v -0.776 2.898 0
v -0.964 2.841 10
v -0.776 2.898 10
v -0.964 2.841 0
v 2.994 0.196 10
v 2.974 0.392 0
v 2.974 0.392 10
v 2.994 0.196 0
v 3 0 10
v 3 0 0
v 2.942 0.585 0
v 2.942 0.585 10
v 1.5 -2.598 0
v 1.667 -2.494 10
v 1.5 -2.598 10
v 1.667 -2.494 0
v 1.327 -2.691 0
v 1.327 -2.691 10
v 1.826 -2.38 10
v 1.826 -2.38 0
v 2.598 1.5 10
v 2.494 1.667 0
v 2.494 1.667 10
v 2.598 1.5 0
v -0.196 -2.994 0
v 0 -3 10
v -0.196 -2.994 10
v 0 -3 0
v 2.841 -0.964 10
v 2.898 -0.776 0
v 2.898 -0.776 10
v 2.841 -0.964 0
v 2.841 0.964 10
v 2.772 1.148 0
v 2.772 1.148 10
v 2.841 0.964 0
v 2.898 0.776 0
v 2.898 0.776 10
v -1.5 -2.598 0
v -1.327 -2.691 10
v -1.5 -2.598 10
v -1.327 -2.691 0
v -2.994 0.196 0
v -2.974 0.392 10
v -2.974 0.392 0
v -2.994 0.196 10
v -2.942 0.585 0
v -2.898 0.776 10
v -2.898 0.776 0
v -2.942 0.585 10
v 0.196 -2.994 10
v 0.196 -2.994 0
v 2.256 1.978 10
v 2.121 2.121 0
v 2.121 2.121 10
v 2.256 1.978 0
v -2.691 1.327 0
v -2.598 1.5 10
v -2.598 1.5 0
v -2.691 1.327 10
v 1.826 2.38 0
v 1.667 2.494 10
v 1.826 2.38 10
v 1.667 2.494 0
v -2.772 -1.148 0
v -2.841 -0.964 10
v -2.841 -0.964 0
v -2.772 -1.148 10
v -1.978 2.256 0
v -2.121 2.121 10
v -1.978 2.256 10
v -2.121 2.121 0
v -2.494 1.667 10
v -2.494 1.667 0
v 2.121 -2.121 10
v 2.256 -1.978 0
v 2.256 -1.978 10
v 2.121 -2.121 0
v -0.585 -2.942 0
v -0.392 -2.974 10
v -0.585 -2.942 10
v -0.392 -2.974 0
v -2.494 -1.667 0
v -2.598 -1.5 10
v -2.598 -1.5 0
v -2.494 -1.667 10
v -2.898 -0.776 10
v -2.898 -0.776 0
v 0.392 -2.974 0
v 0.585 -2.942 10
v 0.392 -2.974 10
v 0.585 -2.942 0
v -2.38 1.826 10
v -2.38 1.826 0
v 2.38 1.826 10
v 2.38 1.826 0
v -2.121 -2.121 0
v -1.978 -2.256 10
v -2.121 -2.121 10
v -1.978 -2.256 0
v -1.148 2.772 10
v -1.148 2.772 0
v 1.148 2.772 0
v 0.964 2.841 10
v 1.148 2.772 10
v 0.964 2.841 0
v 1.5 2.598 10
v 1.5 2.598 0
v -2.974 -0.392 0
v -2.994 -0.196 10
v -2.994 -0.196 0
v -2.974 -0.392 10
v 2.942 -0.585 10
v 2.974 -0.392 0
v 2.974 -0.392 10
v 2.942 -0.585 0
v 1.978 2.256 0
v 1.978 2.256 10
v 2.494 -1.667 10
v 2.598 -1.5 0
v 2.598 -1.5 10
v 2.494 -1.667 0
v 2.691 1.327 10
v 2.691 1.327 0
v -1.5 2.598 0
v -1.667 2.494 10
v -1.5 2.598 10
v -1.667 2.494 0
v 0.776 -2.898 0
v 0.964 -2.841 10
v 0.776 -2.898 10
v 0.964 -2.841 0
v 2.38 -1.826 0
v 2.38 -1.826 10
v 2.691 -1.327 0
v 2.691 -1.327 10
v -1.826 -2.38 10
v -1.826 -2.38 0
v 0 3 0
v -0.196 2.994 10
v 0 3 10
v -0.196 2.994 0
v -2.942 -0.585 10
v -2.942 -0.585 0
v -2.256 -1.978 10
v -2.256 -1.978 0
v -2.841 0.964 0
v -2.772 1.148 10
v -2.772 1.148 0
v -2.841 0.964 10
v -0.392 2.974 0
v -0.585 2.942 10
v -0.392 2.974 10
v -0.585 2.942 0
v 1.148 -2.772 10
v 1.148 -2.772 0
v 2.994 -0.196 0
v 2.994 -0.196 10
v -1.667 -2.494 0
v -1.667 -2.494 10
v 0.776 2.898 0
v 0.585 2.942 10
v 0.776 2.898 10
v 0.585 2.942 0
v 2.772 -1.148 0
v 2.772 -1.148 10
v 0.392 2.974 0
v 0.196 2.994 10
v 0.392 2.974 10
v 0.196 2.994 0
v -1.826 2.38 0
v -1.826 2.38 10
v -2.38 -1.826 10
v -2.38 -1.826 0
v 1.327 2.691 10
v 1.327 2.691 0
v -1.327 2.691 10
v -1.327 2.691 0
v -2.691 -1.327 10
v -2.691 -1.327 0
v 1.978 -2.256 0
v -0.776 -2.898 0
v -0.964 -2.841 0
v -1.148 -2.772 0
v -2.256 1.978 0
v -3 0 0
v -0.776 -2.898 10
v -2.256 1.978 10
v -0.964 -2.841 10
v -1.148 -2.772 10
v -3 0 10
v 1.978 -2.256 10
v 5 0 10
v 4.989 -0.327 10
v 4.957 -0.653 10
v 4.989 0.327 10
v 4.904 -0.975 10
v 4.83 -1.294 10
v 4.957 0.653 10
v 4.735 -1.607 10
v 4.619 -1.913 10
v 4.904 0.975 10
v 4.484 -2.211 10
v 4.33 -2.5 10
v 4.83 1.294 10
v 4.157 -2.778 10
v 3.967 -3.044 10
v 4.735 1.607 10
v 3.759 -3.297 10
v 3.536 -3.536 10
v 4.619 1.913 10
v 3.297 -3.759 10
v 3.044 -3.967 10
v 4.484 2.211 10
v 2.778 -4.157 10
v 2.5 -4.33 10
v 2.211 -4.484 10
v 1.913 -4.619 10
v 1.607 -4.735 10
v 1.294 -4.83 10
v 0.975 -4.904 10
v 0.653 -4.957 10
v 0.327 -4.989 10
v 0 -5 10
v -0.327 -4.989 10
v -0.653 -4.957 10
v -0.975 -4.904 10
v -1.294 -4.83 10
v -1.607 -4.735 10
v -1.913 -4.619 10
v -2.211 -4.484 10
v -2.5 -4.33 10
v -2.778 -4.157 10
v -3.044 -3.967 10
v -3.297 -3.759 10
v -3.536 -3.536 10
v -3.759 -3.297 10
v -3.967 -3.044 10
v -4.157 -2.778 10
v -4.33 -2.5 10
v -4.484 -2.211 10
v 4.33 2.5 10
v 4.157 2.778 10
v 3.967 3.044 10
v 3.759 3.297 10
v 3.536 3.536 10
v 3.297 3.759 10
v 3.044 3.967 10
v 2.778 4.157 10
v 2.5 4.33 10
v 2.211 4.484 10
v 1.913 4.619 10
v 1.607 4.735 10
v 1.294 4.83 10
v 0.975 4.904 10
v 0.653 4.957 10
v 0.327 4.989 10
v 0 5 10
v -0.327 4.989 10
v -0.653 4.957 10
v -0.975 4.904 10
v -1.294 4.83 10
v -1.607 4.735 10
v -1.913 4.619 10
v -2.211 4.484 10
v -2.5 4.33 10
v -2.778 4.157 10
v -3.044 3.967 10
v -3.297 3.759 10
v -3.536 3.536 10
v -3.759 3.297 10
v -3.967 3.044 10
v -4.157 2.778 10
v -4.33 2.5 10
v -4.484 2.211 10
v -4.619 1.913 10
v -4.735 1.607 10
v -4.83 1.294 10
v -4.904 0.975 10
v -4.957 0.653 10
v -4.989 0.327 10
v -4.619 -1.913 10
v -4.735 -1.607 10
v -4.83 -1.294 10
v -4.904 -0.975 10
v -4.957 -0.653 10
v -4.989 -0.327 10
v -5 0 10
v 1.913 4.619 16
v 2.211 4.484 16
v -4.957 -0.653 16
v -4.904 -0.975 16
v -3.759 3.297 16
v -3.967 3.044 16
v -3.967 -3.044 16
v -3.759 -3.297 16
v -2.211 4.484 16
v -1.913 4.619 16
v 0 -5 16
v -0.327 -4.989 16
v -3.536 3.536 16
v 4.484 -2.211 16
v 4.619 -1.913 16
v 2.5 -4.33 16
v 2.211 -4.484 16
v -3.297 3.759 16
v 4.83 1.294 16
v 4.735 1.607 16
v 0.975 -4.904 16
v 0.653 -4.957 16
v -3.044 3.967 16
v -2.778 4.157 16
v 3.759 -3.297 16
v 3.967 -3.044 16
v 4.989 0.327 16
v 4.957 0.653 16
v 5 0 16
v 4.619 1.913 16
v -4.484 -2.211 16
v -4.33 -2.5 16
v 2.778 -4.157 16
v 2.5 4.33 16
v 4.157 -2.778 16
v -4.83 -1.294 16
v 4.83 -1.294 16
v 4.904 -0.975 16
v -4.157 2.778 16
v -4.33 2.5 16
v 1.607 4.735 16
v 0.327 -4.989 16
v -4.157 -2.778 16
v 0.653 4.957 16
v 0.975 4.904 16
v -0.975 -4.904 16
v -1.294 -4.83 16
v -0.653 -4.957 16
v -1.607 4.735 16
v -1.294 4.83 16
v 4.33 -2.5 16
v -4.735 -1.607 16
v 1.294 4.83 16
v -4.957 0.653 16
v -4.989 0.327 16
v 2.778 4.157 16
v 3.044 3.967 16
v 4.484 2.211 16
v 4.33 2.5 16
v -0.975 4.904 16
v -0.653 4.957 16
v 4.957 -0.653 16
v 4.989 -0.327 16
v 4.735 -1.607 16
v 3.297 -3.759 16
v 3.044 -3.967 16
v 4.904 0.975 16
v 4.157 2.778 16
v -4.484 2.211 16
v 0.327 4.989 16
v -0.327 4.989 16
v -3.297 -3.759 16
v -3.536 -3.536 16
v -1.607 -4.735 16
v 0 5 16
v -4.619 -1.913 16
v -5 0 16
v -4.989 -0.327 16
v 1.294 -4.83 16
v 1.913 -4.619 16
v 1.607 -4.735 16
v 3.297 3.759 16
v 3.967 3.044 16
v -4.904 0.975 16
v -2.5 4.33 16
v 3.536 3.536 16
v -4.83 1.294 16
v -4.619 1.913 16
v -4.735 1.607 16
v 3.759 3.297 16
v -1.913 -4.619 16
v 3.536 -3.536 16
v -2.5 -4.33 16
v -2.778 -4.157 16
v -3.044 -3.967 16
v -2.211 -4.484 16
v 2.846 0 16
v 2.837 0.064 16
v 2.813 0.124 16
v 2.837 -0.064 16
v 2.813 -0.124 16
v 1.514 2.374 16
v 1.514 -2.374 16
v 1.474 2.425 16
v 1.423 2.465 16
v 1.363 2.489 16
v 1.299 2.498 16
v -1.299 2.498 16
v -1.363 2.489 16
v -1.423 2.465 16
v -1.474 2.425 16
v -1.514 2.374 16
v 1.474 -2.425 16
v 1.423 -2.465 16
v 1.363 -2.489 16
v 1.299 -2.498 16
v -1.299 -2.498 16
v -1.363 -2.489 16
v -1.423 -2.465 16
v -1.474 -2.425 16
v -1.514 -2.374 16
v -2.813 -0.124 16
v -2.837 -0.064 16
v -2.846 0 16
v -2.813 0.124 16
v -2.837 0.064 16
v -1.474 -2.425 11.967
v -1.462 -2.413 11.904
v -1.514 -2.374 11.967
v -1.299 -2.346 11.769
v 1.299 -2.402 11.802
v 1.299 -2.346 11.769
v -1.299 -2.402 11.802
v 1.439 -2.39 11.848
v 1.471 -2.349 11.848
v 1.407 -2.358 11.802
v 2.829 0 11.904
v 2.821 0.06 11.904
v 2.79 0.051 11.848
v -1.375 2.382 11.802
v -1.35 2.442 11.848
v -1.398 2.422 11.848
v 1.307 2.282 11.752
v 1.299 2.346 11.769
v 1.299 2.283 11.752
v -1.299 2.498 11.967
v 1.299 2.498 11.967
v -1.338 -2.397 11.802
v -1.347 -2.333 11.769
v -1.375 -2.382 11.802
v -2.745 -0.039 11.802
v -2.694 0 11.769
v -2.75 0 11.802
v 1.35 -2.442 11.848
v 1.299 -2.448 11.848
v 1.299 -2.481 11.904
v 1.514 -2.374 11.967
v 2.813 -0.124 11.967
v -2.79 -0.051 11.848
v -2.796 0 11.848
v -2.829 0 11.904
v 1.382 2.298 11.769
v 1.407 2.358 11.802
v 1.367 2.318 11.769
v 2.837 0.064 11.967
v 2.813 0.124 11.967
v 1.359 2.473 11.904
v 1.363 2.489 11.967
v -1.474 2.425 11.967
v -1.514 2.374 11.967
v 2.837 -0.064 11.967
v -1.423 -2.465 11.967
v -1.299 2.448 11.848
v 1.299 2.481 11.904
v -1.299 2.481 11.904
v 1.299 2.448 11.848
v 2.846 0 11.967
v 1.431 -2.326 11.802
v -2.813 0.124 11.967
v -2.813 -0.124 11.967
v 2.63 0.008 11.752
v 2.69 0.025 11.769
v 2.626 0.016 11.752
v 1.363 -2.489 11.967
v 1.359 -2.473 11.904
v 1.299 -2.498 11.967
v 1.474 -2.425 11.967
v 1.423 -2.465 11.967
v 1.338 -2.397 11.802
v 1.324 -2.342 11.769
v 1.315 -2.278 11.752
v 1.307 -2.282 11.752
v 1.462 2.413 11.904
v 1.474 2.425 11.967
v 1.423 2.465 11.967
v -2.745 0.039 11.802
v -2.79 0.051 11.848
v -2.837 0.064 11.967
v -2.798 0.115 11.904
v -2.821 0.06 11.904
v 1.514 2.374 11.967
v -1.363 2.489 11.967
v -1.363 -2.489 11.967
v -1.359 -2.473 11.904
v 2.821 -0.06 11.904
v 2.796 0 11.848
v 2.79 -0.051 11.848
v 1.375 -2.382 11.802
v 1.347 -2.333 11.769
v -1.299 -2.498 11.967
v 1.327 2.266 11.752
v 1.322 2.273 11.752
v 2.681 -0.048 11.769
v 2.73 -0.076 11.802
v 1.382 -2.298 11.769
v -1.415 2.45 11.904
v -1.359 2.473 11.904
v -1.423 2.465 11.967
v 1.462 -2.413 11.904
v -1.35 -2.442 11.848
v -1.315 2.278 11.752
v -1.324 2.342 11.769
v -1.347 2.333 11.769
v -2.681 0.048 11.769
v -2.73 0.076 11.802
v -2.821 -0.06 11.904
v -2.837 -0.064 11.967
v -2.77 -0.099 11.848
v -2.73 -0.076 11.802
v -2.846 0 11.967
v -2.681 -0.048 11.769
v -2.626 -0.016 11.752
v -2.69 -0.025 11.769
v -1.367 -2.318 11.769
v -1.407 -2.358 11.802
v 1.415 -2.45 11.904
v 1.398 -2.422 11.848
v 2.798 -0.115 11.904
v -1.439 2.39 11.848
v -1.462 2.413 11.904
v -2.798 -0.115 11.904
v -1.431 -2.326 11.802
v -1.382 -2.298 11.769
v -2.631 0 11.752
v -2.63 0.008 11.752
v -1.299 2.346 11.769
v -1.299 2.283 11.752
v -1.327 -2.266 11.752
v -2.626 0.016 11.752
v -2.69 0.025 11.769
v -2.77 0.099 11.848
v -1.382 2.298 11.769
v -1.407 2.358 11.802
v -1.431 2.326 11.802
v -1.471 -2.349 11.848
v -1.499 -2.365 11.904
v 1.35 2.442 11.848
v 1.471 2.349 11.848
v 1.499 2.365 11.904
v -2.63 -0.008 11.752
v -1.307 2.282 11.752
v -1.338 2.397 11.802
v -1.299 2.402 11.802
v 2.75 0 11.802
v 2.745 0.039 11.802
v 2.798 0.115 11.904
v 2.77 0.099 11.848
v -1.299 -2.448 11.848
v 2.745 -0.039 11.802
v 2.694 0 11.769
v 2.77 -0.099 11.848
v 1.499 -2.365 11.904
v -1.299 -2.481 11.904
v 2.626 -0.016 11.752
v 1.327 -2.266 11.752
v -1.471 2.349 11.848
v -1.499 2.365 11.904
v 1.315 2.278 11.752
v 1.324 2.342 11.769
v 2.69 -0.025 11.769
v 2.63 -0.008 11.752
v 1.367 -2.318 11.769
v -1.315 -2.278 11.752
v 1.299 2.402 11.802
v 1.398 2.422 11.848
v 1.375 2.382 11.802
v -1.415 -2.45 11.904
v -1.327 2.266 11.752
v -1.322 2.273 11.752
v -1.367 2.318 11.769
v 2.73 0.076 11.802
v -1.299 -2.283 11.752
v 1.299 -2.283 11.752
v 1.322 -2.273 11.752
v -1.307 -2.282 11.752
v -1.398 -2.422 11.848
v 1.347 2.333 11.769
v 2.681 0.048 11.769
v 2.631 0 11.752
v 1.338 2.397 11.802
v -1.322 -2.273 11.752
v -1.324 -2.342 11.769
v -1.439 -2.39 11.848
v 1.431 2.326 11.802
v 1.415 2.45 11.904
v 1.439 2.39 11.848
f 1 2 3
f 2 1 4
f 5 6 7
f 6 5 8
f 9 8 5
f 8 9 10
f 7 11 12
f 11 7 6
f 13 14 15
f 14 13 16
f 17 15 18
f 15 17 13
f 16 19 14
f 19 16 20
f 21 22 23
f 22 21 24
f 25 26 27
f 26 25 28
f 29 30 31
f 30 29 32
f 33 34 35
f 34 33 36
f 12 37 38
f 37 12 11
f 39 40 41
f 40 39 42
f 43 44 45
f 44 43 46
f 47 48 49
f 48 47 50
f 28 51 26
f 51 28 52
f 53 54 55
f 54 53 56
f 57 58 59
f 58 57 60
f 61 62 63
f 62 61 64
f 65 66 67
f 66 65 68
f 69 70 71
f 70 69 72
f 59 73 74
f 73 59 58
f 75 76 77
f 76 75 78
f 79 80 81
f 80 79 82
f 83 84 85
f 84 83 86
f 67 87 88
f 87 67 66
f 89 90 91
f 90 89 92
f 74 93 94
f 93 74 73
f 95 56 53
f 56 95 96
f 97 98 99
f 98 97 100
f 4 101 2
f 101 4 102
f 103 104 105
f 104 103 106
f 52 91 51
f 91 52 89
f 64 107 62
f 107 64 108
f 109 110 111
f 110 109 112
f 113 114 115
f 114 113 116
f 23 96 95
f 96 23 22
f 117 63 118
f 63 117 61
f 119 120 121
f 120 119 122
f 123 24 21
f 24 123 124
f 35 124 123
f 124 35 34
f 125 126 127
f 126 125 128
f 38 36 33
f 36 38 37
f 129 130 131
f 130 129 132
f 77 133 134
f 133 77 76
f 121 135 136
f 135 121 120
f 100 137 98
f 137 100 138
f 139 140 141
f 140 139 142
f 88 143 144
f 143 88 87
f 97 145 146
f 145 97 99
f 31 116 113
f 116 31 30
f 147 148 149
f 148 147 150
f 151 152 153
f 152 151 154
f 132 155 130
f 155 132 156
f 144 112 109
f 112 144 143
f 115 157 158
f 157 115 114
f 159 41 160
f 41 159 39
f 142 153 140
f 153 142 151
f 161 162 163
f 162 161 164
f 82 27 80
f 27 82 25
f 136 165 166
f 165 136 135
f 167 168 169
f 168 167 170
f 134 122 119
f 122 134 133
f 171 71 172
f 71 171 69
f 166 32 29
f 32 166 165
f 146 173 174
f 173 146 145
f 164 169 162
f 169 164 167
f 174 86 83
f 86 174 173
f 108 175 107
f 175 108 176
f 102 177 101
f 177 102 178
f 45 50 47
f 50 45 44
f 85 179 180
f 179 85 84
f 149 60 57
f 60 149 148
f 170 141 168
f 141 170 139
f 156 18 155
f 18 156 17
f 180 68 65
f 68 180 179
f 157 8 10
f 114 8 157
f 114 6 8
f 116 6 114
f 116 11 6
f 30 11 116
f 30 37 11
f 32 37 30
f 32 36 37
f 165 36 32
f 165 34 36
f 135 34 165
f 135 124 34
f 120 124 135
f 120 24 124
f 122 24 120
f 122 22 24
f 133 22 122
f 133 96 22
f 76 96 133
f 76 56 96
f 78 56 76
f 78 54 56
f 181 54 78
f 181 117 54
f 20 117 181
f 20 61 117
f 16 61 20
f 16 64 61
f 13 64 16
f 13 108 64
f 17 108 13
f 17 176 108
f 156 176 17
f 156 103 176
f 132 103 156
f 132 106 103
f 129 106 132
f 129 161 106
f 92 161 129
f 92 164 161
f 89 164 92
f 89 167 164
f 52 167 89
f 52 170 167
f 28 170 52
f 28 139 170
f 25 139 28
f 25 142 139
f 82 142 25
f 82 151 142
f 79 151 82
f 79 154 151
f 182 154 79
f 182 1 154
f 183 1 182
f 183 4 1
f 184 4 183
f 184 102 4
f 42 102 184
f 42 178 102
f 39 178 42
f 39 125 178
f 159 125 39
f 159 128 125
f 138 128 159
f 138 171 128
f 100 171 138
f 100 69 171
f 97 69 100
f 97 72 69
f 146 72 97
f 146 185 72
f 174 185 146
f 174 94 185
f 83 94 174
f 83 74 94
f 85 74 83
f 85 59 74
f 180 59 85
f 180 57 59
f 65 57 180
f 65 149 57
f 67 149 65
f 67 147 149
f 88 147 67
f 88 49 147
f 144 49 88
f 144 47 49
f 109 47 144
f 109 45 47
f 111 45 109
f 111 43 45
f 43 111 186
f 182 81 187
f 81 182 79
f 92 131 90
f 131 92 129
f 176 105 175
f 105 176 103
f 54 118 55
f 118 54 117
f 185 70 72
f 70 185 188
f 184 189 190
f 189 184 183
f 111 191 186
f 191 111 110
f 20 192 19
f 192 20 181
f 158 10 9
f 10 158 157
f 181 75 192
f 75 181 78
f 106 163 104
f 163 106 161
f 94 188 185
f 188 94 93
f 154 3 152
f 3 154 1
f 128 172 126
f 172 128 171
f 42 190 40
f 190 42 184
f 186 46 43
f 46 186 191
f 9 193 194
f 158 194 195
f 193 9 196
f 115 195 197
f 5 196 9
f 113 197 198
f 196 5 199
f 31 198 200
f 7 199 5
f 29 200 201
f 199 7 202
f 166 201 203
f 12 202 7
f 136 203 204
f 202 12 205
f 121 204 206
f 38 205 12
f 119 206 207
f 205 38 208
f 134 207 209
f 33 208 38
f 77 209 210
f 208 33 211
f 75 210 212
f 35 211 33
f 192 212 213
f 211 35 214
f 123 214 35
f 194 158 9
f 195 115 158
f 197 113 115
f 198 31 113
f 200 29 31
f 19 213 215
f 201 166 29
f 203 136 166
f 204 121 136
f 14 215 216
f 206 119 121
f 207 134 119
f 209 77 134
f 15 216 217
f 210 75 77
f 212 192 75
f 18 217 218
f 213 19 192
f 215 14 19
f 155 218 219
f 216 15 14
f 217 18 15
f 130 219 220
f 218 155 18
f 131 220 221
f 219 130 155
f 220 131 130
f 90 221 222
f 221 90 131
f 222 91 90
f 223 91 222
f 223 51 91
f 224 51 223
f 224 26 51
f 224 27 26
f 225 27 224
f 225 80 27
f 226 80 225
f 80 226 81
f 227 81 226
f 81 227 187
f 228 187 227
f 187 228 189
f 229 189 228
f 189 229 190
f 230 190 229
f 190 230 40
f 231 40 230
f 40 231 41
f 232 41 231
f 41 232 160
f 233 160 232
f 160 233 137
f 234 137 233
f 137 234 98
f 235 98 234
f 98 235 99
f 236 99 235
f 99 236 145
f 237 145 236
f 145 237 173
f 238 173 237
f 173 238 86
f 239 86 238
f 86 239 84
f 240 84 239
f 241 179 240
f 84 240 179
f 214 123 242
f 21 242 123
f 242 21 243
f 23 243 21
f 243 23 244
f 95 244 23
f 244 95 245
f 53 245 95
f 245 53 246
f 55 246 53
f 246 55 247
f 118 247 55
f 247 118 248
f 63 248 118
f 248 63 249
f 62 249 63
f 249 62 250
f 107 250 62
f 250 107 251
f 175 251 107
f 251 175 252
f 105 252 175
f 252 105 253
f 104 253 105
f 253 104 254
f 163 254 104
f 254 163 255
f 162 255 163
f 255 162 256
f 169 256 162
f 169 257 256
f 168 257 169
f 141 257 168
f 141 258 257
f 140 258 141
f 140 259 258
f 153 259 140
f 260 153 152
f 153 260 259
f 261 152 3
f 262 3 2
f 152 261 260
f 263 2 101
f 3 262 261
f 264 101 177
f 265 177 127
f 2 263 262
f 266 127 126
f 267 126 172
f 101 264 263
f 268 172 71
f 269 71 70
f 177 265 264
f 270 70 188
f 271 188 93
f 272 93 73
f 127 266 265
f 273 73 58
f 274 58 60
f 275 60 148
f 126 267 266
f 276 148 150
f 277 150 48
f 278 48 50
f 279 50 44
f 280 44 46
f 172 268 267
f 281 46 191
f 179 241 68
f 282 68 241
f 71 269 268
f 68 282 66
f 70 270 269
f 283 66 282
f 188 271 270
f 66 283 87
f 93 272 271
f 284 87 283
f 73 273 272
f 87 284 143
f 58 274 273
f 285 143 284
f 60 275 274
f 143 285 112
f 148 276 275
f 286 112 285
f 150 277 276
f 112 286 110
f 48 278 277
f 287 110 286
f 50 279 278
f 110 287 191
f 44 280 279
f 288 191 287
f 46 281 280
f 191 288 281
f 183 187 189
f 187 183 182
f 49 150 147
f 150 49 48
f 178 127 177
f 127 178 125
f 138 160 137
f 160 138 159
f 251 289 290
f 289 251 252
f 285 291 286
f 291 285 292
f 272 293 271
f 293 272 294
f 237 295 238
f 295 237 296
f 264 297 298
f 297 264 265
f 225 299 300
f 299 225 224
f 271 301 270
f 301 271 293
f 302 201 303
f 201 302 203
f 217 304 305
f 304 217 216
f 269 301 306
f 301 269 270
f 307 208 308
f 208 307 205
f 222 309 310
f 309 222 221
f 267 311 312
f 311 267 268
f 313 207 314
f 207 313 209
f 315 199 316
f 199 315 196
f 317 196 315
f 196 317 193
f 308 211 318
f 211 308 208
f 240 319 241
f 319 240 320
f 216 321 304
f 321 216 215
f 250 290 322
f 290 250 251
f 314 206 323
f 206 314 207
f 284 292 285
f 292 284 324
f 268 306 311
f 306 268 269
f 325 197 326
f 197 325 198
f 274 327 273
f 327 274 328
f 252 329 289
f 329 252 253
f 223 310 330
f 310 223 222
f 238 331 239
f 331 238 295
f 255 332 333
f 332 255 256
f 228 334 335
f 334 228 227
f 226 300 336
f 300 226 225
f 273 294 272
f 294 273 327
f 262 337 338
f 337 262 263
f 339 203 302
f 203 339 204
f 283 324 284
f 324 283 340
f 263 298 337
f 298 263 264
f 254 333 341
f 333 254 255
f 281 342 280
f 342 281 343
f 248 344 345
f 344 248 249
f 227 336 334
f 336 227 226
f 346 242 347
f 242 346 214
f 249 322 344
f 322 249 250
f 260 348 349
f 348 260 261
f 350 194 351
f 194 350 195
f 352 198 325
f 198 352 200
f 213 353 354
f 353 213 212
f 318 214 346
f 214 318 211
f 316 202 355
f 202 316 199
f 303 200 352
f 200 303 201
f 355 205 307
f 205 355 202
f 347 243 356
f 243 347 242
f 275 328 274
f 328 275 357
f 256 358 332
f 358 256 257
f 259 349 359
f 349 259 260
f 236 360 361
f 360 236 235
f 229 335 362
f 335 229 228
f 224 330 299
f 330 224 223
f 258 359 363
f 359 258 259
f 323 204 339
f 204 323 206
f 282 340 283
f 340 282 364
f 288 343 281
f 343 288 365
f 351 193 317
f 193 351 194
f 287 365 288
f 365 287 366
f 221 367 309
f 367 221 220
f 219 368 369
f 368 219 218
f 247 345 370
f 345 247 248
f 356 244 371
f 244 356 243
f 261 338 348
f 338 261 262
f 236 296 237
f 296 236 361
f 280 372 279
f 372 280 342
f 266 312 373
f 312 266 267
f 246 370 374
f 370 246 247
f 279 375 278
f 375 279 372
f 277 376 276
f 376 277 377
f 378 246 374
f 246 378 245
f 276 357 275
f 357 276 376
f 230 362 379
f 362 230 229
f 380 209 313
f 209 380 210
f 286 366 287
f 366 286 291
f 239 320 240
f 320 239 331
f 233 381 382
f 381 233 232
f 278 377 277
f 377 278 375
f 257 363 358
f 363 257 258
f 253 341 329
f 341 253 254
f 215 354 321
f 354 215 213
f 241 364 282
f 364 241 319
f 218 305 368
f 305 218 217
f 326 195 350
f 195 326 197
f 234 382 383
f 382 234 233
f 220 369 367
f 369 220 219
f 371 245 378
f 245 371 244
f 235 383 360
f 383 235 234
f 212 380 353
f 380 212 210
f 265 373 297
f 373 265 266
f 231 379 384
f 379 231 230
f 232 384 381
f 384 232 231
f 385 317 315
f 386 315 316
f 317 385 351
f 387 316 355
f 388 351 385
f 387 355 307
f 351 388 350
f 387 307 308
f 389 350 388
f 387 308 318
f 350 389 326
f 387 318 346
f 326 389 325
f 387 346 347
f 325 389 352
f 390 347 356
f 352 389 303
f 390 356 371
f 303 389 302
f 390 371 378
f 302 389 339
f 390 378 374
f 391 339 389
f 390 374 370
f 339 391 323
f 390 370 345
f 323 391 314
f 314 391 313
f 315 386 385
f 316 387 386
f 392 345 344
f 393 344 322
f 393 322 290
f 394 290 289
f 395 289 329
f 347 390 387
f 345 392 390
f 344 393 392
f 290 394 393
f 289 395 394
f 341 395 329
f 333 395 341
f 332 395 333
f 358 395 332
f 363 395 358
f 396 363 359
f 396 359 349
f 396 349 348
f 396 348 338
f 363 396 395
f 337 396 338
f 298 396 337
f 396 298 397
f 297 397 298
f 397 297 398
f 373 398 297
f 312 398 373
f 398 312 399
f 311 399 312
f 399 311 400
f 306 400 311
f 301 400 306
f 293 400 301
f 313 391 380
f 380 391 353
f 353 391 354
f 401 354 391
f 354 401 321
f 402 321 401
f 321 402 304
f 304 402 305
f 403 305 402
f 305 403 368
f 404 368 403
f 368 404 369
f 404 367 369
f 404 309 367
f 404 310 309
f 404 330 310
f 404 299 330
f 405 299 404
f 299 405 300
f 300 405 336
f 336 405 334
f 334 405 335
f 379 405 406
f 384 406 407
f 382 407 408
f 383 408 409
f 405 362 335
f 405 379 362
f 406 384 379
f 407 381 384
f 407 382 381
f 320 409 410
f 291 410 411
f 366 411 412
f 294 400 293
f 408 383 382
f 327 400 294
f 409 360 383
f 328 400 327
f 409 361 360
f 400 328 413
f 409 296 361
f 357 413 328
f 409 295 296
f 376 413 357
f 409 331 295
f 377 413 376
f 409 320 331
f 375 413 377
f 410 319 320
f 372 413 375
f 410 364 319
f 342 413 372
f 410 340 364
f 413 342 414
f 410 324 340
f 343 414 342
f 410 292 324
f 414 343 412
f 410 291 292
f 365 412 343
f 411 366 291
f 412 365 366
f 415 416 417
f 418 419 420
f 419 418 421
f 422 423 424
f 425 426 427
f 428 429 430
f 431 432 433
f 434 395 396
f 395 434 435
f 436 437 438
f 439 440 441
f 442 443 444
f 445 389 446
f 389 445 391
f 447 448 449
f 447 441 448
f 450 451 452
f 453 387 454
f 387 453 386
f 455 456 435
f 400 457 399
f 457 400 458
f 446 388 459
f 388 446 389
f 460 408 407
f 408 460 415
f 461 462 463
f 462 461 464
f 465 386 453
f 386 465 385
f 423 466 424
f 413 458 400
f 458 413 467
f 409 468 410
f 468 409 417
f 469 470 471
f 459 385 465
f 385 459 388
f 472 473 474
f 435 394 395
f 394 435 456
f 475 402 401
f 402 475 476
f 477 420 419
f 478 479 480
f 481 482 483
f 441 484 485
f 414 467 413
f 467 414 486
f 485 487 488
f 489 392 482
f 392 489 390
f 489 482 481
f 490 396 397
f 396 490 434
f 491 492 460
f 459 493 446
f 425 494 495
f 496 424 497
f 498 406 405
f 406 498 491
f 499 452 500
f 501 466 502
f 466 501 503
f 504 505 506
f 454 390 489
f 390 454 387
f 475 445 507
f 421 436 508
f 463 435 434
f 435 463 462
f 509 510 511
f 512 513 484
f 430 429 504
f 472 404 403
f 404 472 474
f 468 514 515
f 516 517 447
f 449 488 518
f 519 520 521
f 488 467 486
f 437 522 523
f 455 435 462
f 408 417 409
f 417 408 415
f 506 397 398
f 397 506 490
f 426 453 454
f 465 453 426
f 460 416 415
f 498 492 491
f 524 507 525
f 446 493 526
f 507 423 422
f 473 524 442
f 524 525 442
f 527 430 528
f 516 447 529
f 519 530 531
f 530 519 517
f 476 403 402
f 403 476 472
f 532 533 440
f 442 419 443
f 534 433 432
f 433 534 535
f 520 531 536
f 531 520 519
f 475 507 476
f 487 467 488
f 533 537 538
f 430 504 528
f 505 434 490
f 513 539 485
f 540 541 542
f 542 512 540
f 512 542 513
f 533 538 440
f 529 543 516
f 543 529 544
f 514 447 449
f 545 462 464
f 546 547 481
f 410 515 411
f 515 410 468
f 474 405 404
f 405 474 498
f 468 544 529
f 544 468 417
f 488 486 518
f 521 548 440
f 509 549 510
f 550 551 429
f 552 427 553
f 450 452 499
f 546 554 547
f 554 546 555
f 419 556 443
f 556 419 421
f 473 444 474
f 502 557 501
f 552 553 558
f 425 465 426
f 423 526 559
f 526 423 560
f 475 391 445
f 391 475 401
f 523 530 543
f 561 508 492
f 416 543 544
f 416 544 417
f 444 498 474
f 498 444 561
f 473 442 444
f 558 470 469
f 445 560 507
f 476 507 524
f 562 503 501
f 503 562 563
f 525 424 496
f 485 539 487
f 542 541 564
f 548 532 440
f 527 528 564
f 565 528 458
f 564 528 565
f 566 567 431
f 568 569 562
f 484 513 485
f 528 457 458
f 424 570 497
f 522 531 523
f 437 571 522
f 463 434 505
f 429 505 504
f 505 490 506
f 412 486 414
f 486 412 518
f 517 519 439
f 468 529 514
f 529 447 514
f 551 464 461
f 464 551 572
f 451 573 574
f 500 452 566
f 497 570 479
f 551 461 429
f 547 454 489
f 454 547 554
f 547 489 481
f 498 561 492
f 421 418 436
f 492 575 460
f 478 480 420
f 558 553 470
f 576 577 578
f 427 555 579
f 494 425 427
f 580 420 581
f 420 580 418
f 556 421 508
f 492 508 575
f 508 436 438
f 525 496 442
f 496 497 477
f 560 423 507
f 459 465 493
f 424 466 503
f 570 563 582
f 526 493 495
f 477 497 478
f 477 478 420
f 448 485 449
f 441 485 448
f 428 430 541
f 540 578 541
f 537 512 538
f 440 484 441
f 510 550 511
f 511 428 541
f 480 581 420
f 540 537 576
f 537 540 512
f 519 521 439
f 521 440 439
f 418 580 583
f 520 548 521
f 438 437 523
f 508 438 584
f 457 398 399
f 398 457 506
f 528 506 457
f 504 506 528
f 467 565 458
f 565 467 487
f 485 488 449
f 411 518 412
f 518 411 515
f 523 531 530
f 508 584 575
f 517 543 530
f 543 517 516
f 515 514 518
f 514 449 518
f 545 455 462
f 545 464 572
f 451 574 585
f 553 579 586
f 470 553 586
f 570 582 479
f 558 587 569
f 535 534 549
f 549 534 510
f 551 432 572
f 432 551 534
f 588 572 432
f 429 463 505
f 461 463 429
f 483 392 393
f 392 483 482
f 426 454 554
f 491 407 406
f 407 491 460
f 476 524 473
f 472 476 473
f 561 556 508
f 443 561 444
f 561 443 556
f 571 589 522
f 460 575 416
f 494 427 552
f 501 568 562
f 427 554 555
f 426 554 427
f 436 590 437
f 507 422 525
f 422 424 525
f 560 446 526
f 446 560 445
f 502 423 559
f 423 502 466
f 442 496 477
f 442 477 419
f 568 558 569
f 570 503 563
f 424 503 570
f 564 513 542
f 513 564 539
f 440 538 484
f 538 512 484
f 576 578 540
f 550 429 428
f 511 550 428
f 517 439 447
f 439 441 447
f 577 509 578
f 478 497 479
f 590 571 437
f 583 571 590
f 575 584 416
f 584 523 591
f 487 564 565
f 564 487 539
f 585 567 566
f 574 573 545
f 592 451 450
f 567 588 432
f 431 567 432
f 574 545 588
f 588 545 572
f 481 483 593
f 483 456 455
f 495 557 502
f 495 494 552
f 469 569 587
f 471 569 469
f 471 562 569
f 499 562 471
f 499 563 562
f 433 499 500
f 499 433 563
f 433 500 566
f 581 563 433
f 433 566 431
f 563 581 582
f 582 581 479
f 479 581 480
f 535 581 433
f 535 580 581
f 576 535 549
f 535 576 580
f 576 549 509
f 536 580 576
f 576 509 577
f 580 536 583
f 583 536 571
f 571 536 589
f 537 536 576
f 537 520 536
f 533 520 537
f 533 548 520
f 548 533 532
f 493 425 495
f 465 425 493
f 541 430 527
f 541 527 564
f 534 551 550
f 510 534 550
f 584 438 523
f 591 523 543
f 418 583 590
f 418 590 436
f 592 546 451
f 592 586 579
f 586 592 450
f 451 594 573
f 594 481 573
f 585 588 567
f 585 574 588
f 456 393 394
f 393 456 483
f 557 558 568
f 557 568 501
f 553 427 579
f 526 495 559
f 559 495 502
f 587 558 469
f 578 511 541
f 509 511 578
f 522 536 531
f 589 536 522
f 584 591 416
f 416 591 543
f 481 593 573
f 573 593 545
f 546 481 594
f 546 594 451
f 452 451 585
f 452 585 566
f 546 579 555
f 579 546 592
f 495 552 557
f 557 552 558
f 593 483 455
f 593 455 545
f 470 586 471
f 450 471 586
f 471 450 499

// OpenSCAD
$fn=96;

d_shaft = 6.0;
L = 10.0;

d_head = 10.0;
h_head = 6.0;

// Approximate hex socket dimensions for an M6 socket head cap screw
socket_af = 5.0;          // across flats
socket_depth = 4.0;       // depth
socket_corner_r = 0.25;   // slight rounding

module hex_prism(af, h){
    // Regular hex with across-flats = af
    r = af / sqrt(3); // circumradius
    cylinder(h=h, r=r, $fn=6);
}

module socket_head_cap_screw(){
    difference(){
        union(){
            // Shaft
            translate([0,0,0])
                cylinder(h=L, d=d_shaft);

            // Head on top of shaft
            translate([0,0,L])
                cylinder(h=h_head, d=d_head);
        }

        // Hex socket cut into head from top
        translate([0,0,L + h_head - socket_depth])
            minkowski(){
                hex_prism(socket_af - 2*socket_corner_r, socket_depth);
                sphere(r=socket_corner_r, $fn=24);
            }
    }
}

socket_head_cap_screw();
